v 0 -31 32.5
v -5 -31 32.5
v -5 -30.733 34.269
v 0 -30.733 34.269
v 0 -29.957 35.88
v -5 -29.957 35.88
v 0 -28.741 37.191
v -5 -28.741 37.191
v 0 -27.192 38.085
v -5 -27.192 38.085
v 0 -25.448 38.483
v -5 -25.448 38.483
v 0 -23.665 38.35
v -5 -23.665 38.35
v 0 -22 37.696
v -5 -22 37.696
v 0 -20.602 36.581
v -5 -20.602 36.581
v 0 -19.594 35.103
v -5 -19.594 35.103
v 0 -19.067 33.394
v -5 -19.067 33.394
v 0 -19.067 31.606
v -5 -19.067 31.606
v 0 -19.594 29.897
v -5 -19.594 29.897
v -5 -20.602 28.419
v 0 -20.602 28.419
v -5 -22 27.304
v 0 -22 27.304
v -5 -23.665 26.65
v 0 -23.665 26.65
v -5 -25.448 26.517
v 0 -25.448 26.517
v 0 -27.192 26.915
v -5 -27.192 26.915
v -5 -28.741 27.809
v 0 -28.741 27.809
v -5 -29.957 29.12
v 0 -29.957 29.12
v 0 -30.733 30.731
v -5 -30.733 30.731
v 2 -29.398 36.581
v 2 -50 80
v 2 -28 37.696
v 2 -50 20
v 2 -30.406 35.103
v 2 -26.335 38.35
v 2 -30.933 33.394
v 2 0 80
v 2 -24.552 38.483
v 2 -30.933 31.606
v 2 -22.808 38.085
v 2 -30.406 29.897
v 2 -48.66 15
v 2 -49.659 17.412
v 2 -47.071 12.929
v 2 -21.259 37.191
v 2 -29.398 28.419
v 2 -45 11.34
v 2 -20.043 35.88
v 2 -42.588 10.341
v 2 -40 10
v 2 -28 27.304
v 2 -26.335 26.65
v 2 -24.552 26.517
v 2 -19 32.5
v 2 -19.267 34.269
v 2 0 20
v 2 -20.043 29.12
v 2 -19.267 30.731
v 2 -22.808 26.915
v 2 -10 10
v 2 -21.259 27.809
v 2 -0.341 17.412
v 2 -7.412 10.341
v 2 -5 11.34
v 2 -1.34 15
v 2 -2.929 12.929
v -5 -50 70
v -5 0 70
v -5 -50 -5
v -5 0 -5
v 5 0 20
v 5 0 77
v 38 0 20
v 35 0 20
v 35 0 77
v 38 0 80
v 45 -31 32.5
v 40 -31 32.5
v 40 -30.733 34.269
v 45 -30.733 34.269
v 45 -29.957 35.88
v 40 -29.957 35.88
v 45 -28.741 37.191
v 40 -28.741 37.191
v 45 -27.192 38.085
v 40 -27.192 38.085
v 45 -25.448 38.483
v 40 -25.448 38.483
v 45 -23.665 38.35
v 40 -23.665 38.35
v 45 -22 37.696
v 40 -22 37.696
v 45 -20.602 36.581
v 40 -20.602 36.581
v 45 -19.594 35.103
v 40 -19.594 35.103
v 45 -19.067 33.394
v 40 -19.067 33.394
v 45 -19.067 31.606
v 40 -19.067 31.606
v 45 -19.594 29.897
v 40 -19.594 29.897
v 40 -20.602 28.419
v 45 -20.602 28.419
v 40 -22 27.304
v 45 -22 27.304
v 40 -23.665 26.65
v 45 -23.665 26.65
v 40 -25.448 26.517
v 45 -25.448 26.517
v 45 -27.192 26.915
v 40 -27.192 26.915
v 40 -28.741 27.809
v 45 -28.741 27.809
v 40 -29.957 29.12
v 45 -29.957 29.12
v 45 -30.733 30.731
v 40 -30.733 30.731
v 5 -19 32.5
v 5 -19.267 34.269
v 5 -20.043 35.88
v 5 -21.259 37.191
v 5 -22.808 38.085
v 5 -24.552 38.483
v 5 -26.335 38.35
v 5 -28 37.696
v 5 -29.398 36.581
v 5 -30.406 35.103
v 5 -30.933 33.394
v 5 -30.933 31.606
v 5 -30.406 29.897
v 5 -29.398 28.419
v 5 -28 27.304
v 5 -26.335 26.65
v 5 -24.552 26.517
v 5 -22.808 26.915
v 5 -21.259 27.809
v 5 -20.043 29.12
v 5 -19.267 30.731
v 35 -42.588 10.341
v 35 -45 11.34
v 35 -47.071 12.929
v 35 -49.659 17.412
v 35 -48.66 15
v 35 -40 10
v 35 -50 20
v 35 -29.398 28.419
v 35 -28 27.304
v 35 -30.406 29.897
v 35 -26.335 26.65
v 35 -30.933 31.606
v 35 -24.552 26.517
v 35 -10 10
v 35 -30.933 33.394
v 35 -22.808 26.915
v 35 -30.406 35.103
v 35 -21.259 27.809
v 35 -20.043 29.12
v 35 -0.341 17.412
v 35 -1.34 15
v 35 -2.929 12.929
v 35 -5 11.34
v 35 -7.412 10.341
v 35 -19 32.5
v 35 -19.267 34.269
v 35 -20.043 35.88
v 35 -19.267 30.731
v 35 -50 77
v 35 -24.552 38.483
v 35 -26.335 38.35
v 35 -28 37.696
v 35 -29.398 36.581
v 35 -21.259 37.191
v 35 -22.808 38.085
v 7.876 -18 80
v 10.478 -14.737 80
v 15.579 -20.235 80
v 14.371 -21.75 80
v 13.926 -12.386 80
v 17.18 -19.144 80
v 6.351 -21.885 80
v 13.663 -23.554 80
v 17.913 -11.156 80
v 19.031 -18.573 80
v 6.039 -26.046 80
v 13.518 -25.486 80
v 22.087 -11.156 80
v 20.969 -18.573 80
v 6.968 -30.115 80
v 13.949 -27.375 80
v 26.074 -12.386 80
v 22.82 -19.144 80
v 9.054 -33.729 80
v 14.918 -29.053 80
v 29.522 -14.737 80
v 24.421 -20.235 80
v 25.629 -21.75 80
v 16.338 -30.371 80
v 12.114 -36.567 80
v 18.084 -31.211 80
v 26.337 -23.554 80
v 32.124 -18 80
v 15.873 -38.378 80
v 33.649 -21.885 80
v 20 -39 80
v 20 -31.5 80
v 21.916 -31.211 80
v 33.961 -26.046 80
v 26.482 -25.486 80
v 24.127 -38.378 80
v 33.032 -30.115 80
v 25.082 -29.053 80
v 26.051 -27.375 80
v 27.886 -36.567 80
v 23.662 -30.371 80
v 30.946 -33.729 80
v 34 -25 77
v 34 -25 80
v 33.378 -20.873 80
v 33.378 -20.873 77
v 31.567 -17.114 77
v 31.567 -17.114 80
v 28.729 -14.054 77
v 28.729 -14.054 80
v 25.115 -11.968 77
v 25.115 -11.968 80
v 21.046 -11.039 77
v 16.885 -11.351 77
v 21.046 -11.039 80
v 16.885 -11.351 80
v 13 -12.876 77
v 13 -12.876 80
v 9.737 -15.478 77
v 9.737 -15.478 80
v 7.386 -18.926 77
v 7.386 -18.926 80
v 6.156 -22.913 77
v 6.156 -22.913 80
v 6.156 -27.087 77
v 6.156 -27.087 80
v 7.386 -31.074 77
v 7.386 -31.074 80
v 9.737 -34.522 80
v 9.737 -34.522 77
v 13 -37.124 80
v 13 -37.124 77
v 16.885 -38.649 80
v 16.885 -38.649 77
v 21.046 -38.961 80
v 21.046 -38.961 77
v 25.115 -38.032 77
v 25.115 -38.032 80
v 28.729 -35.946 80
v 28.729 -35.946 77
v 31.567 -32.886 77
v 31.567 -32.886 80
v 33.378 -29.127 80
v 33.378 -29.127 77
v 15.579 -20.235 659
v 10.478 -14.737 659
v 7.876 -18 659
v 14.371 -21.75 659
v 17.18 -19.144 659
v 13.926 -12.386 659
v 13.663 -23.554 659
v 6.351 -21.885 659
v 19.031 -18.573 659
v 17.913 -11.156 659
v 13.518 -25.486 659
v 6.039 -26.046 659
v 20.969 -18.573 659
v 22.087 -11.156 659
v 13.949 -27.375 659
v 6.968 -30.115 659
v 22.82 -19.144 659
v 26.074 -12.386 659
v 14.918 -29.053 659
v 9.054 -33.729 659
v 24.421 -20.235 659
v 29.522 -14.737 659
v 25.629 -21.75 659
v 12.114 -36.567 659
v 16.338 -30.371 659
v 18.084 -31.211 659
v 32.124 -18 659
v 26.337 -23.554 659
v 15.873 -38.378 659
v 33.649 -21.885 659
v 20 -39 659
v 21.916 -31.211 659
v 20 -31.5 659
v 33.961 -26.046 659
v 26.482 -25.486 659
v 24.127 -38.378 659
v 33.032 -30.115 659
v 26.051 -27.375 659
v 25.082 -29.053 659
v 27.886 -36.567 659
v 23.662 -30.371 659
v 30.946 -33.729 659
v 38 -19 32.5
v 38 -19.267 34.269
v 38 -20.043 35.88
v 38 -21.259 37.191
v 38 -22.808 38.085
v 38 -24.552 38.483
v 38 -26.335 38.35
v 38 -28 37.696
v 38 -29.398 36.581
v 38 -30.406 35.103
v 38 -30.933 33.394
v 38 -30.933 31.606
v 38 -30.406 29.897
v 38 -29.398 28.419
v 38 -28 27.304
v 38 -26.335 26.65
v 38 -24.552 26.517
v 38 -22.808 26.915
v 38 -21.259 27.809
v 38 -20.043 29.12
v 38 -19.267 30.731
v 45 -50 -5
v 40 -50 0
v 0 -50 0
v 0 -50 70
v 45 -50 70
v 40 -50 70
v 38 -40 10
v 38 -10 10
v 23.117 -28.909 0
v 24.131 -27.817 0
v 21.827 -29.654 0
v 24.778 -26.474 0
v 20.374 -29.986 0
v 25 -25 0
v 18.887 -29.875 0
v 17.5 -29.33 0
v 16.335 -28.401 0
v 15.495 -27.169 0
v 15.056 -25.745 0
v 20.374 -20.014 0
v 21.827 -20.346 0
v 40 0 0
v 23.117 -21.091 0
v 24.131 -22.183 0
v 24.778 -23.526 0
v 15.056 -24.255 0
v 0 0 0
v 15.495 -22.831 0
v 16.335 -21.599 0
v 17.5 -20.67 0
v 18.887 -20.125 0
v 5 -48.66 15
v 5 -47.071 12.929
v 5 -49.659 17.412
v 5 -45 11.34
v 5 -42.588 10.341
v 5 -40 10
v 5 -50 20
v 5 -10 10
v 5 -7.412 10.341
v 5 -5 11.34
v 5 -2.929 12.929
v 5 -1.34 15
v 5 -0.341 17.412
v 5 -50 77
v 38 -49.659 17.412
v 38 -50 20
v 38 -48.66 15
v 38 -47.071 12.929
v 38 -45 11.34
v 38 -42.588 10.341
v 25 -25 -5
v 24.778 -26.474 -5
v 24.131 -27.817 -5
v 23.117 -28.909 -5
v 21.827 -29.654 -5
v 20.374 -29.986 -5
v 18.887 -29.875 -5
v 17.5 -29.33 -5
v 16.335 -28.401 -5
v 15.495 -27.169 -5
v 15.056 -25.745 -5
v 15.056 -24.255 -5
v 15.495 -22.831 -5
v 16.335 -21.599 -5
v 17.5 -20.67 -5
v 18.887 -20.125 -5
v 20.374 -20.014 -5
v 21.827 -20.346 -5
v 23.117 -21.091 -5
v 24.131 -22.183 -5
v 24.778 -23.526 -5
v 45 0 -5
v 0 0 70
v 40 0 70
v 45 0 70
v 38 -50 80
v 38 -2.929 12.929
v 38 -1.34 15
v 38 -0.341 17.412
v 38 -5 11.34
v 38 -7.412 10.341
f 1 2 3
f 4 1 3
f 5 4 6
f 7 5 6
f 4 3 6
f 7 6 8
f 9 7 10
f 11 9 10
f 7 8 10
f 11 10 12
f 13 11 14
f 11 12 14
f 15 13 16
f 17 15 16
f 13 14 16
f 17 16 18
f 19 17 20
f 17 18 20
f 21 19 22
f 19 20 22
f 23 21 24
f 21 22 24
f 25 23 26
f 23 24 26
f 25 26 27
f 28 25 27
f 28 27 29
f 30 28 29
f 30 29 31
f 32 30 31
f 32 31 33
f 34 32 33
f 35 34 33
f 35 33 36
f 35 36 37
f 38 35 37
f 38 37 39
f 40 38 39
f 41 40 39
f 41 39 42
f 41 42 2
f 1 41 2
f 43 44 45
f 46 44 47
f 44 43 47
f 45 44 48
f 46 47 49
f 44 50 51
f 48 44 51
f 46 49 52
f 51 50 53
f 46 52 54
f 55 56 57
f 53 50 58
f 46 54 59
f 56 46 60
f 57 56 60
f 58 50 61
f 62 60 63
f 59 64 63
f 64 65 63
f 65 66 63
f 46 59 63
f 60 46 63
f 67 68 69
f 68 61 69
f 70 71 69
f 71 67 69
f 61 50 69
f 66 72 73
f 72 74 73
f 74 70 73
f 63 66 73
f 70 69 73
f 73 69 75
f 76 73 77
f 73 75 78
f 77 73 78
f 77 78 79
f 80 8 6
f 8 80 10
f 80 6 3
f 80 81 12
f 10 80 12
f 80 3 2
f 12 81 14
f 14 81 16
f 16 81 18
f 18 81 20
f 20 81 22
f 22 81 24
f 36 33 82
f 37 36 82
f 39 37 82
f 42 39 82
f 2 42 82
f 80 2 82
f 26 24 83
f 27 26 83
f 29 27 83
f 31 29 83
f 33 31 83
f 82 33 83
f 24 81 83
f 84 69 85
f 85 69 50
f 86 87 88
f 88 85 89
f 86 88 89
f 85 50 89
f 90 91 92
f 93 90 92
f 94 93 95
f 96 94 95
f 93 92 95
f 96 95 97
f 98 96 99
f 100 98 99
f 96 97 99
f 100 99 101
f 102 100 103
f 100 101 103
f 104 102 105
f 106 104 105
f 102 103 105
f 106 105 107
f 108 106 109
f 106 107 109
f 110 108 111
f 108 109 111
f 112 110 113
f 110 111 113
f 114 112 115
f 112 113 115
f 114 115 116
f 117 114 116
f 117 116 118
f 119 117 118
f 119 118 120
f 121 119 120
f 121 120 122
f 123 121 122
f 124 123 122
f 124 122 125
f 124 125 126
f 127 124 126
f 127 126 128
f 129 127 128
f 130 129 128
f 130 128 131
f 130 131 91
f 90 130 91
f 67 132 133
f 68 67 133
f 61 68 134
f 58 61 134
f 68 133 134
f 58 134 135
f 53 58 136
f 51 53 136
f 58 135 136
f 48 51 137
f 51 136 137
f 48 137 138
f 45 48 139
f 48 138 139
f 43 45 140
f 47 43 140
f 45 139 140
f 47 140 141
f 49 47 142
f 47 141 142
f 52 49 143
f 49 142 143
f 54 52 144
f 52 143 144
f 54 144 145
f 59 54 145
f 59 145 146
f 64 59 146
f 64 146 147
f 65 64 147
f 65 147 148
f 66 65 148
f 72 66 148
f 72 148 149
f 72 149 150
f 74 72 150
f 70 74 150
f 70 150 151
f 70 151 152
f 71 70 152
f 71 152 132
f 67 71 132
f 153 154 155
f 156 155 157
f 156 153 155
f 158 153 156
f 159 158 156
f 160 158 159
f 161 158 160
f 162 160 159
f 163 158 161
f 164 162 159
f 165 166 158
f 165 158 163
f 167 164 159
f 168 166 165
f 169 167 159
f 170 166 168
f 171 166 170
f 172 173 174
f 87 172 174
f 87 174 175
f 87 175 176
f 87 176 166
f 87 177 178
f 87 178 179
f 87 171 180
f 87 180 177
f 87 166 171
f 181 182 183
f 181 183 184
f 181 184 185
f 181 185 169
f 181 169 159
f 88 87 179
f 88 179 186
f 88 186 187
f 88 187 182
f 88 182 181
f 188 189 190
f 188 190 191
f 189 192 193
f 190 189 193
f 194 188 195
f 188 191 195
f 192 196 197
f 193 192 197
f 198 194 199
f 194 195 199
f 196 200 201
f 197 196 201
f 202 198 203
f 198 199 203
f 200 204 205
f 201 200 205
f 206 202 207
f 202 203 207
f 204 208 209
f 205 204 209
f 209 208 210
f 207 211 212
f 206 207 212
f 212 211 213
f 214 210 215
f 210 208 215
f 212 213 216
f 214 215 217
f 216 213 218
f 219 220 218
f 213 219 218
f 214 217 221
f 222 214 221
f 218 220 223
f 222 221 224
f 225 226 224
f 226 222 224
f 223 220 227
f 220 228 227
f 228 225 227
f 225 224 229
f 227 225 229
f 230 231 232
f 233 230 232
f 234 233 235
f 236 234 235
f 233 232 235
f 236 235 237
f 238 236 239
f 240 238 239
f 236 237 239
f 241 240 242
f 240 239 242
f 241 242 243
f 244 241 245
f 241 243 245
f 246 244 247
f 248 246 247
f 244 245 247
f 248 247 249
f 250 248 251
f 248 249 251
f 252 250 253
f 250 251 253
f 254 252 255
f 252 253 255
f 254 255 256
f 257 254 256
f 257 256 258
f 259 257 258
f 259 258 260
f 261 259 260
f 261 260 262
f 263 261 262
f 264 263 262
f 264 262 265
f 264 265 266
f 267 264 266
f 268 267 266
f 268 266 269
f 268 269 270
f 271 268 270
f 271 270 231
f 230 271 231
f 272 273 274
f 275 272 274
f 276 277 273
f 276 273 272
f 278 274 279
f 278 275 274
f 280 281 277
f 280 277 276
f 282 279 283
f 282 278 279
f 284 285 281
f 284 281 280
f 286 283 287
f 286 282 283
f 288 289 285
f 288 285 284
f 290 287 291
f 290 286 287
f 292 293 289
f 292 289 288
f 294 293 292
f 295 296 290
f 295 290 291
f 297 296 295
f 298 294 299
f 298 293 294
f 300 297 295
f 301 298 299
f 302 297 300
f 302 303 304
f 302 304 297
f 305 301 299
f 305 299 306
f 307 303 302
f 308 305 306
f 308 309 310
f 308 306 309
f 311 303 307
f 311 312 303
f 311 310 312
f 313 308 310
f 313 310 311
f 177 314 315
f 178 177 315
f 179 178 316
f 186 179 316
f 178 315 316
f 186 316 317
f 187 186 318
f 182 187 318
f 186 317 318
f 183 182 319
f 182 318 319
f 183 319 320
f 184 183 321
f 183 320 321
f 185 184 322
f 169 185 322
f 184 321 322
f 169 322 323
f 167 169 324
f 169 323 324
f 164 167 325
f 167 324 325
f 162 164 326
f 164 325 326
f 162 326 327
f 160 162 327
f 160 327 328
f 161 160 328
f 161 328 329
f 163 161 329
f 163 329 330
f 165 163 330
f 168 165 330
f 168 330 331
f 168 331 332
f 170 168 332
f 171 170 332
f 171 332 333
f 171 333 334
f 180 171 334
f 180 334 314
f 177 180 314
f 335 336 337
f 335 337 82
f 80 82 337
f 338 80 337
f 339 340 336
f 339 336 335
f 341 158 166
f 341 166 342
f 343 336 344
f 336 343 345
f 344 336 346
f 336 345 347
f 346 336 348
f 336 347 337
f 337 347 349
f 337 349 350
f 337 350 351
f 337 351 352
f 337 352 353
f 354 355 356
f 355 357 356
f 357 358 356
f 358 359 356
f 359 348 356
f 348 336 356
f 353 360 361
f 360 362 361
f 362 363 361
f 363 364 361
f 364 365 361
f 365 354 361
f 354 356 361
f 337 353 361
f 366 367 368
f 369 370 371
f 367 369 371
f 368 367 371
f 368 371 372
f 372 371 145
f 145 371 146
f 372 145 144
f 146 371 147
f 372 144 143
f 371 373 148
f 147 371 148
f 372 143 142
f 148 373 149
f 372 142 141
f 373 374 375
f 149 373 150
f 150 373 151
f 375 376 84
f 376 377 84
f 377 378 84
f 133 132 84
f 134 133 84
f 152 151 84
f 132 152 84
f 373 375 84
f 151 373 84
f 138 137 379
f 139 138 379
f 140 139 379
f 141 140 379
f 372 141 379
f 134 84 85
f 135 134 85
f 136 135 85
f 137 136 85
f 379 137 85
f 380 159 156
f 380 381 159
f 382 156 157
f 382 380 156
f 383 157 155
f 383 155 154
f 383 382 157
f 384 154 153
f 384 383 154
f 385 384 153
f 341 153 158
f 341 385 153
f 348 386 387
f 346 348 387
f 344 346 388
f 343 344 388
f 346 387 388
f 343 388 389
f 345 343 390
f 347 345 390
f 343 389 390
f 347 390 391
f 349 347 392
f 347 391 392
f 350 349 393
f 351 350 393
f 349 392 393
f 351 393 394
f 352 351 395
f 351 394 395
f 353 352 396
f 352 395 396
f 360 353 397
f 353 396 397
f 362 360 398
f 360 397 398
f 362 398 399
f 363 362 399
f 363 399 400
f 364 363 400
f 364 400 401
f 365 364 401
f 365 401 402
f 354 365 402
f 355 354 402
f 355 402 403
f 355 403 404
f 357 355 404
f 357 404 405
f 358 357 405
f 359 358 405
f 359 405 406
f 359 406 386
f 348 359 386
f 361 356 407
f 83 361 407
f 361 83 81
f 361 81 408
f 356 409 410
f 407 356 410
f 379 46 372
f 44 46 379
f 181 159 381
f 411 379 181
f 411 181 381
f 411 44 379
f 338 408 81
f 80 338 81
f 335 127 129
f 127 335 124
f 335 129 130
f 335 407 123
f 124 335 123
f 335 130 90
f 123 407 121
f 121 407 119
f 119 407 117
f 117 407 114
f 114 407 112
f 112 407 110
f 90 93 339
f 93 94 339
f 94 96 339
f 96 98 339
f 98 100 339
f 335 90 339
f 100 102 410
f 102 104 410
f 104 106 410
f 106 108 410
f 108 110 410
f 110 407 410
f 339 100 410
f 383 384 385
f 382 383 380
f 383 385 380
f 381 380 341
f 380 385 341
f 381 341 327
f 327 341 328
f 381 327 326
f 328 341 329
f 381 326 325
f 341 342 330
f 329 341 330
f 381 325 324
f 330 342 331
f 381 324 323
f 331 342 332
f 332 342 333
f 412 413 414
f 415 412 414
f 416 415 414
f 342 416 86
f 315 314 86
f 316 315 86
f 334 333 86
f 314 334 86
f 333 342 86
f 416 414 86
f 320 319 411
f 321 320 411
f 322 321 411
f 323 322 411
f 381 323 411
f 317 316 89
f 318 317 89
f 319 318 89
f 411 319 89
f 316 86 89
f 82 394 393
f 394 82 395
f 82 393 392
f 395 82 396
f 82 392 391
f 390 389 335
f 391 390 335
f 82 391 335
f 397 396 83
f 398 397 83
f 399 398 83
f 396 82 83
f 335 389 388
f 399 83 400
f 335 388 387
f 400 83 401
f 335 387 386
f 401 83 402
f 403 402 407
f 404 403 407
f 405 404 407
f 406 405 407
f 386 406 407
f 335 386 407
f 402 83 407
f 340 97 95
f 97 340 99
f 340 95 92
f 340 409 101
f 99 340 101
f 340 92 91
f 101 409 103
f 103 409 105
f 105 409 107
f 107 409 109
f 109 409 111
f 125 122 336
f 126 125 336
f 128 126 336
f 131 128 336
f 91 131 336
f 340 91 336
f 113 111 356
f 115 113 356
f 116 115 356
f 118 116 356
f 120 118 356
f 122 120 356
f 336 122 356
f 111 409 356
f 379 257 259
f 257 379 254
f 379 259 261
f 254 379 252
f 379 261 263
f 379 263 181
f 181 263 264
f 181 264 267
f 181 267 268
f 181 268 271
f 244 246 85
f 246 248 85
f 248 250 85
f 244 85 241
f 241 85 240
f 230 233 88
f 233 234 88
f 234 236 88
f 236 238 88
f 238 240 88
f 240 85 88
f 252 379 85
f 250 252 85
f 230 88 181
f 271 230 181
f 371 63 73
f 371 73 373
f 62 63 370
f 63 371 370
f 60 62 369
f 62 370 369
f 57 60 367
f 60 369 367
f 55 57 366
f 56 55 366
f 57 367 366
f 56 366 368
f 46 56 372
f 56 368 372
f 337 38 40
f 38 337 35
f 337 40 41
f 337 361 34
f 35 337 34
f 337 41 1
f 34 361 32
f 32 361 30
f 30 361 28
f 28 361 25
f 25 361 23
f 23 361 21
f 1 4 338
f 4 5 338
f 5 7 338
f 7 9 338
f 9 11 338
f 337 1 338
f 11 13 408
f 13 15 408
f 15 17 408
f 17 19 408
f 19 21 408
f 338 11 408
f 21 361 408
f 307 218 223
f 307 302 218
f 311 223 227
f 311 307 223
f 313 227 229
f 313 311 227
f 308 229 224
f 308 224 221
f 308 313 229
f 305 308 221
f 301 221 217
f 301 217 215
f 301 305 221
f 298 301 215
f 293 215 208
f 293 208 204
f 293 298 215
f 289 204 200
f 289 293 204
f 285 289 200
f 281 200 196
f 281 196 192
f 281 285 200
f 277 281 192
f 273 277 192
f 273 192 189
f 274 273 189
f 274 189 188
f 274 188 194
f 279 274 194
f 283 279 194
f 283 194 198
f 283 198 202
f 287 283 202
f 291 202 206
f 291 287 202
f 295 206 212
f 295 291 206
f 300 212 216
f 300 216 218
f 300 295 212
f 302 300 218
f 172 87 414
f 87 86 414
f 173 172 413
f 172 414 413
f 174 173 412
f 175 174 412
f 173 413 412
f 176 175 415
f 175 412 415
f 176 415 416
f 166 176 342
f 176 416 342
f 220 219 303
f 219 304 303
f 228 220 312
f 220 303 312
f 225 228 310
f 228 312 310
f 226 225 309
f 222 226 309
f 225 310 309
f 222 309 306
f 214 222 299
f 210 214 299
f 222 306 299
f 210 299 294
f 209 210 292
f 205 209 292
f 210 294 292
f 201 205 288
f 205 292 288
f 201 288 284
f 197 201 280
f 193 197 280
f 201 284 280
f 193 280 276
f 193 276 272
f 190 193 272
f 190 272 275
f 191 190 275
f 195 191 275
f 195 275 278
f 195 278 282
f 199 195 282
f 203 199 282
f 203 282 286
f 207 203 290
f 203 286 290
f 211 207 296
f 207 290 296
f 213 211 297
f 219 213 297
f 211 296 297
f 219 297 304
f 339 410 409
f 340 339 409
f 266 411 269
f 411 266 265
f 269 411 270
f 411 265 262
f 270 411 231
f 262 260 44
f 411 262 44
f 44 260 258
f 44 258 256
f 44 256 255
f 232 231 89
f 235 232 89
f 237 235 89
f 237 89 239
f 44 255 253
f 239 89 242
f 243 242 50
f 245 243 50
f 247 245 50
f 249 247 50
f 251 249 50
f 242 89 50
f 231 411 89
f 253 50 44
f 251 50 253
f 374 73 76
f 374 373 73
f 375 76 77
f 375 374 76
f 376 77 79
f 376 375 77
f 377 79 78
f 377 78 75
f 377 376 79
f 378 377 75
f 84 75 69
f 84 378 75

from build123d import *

# Parameters (mm, degrees)
F1_DEPTH  = 50
F2_R      = 5
F3_DEPTH  = 25
F4_R      = 6
F5_DEPTH  = 50
F6_W      = 3
F6_H      = 67
F6_H_2    = 3
F6_W_2    = 30
F7_DEPTH  = 50
F8_R      = 6
F9_DEPTH  = 36
F10_R     = 14
F11_DEPTH = 5
F13_W     = 7.5
F13_H     = 579
F15_R     = 10


with BuildPart() as f1:
    # F0 (on Front) → F1 (new body)
    with BuildSketch(Plane.XZ):
        Polygon((40, 0), (0, 0), (0, 70), (-5, 70), (-5, -5), (45, -5), (45, 70), (40, 70), align=None)
    extrude(amount=F1_DEPTH)

    # F2 (on face) → F3 (cut)
    with BuildSketch(Plane(origin=(0, 0, -5), x_dir=(1, 0, 0), z_dir=(0, 0, -1))):
        with Locations((20, 25)):
            Circle(F2_R)
    extrude(amount=-F3_DEPTH, mode=Mode.SUBTRACT)

    # F4 (on face) → F5 (cut)
    with BuildSketch(Plane(origin=(-5, 0, 0), x_dir=(0, -1, 0), z_dir=(-1, 0, 0))):
        with Locations((25, 32.5)):
            Circle(F4_R)
    extrude(amount=-F5_DEPTH, mode=Mode.SUBTRACT)


with BuildPart() as f7:
    # F6 (on Front) → F7 (new body)
    with BuildSketch(Plane.XZ):
        with Locations((3.5, 43.5)):
            Rectangle(F6_W, F6_H)
        with Locations((3.5, 78.5)):
            Rectangle(F6_W, F6_H_2)
        with Locations((20, 78.5)):
            Rectangle(F6_W_2, F6_H_2)
        with Locations((36.5, 78.5)):
            Rectangle(F6_W, F6_H_2)
        with Locations((36.5, 43.5)):
            Rectangle(F6_W, F6_H)
    extrude(amount=F7_DEPTH)

    # F8 (on face) → F9 (cut)
    with BuildSketch(Plane.YZ.offset(38)):
        with Locations((-25, 32.5)):
            Circle(F8_R)
    extrude(amount=-F9_DEPTH, mode=Mode.SUBTRACT)

    # F10 (on face) → F11 (cut)
    with BuildSketch(Plane.XY.offset(80)):
        with Locations((20, -25)):
            Circle(F10_R)
    extrude(amount=-F11_DEPTH, mode=Mode.SUBTRACT)

    # F15
    f15_edges = [f7.edges().sort_by_distance(p)[0] for p in [
        (36.5, -50, 10),
        (3.5, -50, 10),
        (36.5, 0, 10),
        (3.5, 0, 10),
    ]]
    fillet(f15_edges, radius=F15_R)


with BuildPart() as f14:
    # F13 (on offset) → F14 (revolve)
    with BuildSketch(Plane.YZ.offset(20)):
        with Locations((-35.25, 369.5)):
            Rectangle(F13_W, F13_H)
    revolve(axis=Axis((20, -25, 369.5), (0, 0, 1)))


solid = Compound([f1.part, f7.part, f14.part])
